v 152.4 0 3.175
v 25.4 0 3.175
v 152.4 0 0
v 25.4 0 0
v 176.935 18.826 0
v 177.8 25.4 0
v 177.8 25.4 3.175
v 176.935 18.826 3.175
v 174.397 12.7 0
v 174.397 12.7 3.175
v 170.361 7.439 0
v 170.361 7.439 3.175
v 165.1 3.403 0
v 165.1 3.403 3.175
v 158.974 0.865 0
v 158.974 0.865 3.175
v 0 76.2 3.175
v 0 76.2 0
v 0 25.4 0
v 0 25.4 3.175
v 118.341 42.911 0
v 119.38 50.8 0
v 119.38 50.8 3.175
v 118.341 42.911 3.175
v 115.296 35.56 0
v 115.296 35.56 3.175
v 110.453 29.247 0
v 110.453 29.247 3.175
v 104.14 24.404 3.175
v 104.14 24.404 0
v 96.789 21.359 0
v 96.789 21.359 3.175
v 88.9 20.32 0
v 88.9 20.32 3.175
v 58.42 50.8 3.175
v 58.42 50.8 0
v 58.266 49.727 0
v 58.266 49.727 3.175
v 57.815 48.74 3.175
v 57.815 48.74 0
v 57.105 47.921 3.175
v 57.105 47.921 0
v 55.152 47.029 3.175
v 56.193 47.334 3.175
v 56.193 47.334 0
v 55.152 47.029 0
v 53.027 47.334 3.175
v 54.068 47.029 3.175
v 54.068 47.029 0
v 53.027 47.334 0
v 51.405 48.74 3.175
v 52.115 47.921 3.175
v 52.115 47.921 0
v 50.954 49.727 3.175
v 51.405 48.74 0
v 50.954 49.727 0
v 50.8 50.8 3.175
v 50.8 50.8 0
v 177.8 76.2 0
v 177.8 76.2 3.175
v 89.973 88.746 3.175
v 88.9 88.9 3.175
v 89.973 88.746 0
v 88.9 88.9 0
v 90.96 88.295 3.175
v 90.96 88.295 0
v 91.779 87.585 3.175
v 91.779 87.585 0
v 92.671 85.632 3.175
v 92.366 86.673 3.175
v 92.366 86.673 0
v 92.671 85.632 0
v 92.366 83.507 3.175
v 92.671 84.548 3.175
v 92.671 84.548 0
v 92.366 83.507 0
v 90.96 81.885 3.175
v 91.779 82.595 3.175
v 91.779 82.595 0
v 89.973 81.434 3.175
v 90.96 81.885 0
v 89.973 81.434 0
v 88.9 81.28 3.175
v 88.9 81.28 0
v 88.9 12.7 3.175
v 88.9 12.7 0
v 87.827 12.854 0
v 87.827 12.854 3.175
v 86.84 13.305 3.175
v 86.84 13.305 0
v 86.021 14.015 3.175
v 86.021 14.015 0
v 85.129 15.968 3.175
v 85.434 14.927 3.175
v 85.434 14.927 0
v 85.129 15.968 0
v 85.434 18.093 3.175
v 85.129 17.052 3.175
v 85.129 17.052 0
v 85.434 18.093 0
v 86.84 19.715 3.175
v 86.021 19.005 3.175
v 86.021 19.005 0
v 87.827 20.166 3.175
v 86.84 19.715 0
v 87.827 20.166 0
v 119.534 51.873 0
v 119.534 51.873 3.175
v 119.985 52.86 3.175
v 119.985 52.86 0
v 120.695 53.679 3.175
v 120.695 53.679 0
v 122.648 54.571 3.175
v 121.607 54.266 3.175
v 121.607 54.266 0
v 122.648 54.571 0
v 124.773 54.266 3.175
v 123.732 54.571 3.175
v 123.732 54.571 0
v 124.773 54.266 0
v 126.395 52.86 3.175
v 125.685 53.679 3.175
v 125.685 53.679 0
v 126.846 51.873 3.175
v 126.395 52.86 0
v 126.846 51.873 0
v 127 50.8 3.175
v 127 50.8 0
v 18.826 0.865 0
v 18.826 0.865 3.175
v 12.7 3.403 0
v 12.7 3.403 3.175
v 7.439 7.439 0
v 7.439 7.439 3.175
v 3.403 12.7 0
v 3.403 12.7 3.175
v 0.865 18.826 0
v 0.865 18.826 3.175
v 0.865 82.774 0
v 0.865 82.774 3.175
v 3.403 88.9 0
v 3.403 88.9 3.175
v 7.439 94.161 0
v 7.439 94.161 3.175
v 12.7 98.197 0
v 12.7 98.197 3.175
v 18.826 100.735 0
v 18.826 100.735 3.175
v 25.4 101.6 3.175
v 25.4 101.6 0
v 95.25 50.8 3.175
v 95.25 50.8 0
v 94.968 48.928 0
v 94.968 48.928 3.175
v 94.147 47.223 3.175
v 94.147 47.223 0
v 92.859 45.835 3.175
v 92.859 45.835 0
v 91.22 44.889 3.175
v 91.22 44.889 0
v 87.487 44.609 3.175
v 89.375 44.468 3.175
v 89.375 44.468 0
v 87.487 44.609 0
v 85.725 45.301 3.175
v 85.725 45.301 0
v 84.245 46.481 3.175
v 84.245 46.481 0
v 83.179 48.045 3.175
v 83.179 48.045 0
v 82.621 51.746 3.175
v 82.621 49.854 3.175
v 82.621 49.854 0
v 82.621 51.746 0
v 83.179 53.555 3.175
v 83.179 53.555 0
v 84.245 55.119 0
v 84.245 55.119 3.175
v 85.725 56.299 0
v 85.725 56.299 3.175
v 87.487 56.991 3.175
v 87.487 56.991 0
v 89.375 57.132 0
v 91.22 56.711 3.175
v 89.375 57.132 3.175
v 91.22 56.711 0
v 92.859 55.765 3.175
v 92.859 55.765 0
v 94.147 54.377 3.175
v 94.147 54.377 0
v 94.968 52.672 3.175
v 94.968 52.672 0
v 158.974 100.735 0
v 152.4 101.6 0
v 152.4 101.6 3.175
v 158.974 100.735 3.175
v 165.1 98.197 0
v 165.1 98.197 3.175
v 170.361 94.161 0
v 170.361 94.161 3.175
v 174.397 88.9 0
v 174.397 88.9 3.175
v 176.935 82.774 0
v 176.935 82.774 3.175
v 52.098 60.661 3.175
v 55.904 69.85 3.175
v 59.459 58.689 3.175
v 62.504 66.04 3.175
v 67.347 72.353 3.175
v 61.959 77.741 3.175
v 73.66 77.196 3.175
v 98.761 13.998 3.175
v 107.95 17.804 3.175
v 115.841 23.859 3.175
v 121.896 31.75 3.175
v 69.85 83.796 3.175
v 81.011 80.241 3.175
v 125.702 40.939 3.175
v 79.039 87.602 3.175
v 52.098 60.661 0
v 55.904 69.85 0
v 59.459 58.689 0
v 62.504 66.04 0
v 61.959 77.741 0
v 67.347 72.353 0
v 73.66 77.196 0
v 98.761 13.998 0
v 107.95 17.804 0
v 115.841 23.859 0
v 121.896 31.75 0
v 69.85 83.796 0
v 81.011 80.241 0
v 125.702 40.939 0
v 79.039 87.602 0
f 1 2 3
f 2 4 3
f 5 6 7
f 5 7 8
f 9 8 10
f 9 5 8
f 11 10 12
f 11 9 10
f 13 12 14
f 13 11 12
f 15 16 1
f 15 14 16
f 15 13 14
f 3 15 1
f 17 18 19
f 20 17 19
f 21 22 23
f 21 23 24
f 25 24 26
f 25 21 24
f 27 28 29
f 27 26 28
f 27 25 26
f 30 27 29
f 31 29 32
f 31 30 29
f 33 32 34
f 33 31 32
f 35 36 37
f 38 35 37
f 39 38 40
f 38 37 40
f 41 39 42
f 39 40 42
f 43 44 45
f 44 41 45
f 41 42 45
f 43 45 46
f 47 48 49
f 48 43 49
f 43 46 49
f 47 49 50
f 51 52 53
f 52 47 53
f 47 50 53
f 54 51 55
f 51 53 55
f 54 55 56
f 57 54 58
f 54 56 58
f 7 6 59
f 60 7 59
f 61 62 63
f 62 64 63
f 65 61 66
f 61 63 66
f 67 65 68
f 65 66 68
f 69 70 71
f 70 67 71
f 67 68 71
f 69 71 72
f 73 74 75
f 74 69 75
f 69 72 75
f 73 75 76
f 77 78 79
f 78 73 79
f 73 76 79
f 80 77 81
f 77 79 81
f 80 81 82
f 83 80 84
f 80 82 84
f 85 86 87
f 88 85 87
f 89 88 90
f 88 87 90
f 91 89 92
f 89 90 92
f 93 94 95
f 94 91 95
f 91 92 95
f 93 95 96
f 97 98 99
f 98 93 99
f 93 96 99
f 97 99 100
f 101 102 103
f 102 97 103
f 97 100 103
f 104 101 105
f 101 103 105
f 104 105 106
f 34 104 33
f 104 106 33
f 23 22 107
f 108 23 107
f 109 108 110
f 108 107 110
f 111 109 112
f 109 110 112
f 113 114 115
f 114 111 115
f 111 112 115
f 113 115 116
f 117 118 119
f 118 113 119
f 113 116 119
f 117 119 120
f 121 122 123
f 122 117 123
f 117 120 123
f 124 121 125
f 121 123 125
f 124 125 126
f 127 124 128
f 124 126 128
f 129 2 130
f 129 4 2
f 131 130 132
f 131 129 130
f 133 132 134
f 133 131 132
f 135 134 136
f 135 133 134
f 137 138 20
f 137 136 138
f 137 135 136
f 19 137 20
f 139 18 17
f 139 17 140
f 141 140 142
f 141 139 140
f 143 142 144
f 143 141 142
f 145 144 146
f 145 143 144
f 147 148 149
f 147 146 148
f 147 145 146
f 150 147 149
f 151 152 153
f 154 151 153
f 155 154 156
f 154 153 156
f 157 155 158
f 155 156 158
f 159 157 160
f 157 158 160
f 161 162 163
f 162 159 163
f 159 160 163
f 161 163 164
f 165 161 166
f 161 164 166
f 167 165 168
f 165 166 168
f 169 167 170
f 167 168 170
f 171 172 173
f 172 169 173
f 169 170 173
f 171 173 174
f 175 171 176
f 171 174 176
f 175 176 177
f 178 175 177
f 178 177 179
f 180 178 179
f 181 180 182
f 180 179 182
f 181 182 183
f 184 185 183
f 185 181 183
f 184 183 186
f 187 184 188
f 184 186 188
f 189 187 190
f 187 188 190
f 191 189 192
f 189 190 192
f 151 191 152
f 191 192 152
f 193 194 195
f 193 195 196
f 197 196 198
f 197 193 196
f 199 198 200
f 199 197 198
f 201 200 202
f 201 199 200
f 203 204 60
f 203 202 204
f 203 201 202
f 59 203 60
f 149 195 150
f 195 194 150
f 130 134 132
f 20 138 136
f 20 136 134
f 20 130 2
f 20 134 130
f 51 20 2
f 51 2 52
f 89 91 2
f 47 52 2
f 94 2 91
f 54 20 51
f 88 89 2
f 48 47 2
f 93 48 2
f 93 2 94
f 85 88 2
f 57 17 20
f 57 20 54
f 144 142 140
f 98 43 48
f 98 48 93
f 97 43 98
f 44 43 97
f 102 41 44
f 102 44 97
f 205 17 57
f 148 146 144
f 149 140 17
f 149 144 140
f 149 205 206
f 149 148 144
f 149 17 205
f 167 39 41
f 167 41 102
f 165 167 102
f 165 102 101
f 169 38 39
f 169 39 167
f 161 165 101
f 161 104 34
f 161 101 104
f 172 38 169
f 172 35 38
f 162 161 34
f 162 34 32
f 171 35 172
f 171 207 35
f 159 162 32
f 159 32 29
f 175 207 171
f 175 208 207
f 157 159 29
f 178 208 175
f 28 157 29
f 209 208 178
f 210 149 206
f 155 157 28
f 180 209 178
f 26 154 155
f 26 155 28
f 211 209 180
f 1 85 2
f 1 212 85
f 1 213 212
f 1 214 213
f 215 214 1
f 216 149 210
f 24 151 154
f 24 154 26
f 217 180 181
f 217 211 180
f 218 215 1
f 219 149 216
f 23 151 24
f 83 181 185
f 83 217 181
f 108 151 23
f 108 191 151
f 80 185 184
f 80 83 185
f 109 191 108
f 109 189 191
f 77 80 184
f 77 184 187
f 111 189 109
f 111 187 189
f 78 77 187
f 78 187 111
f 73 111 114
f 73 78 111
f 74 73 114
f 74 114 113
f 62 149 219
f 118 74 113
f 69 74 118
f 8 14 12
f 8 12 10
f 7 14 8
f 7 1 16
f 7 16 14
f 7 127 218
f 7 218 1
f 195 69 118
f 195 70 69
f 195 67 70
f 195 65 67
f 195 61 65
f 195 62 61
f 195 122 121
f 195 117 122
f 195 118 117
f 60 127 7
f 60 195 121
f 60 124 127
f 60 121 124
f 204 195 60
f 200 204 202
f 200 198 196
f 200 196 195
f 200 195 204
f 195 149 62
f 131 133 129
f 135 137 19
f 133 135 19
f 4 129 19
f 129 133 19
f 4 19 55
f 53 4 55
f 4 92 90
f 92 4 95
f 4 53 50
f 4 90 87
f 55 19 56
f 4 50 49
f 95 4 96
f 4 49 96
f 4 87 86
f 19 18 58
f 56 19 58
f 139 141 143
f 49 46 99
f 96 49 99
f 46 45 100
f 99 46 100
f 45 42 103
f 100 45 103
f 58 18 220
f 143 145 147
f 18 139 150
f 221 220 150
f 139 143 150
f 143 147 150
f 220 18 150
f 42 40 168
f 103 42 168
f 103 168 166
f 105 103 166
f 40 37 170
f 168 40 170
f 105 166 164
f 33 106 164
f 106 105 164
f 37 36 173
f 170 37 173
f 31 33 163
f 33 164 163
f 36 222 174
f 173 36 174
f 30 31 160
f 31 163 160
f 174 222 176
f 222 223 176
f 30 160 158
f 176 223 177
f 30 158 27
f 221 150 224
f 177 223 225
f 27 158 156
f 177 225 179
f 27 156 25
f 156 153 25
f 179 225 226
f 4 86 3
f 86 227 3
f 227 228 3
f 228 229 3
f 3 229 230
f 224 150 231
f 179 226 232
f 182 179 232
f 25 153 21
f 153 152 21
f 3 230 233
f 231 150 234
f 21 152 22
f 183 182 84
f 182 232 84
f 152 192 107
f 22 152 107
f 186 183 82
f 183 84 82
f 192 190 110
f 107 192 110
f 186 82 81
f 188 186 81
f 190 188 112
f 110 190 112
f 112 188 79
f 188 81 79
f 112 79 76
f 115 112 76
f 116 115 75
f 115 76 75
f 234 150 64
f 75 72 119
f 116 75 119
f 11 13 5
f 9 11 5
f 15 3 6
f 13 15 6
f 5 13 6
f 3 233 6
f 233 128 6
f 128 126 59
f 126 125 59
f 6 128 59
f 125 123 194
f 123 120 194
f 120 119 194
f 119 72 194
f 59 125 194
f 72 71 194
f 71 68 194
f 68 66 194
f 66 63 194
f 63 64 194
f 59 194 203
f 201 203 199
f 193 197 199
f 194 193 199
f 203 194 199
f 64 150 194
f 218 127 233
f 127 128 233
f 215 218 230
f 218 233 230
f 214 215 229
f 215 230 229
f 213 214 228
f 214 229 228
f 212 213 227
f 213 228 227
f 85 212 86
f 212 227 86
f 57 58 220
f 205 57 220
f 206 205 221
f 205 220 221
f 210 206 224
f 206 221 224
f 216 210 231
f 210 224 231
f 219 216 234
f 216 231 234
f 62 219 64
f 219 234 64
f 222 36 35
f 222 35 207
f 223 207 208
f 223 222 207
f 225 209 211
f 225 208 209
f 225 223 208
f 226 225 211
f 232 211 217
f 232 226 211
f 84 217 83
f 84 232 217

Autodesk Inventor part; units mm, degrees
ref_plane "YZ Plane" through (0, 0, 0) normal (1, 0, 0) x (0, 1, 0)
ref_plane "XZ Plane" through (0, 0, 0) normal (0, 1, 0) x (-1, 0, 0)
ref_plane "XY Plane" through (0, 0, 0) normal (0, 0, 1) x (1, 0, 0)
sketch "Sketch1" plane through (0, 0, 0) normal (0, 0, 1) x (1, 0, 0)
  line L0 (0, 0) -> (177.8, 0)
  line L1 (177.8, 0) -> (177.8, 101.6)
  line L2 (177.8, 101.6) -> (0, 101.6)
  line L3 (0, 101.6) -> (0, 0)
  arc A0 (25.4, 101.6) -> (0, 76.2) centre (25.4, 76.2) ccw
  arc A1 (177.8, 76.2) -> (152.4, 101.6) centre (152.4, 76.2) ccw
  arc A2 (152.4, 0) -> (177.8, 25.4) centre (152.4, 25.4) ccw
  arc A3 (0, 25.4) -> (25.4, 0) centre (25.4, 25.4) ccw
  circle A4 centre (88.9, 50.8) radius 6.35
  arc A5 (88.9, 85.09) -> (54.61, 50.8) centre (88.9, 50.8) ccw construction
  arc A6 (88.9, 88.9) -> (50.8, 50.8) centre (88.9, 50.8) ccw
  arc A7 (88.9, 81.28) -> (58.42, 50.8) centre (88.9, 50.8) ccw
  arc A8 (88.9, 81.28) -> (88.9, 88.9) centre (88.9, 85.09) ccw
  arc A9 (50.8, 50.8) -> (58.42, 50.8) centre (54.61, 50.8) ccw
  line L4 (88.9, 50.8) -> (54.61, 50.8) construction
  line L5 (88.9, 50.8) -> (88.9, 85.09) construction
  arc A10 (88.9, 20.32) -> (119.38, 50.8) centre (88.9, 50.8) ccw
  line L6 (88.9, 50.8) -> (123.19, 50.8) construction
  arc A11 (88.9, 16.51) -> (123.19, 50.8) centre (88.9, 50.8) ccw construction
  arc A12 (127, 50.8) -> (119.38, 50.8) centre (123.19, 50.8) ccw
  arc A13 (88.9, 12.7) -> (127, 50.8) centre (88.9, 50.8) ccw
  arc A14 (88.9, 20.32) -> (88.9, 12.7) centre (88.9, 16.51) ccw
  point P0 (0, 0)
  dimension "d2" = 177.8
  dimension "d3" = 101.6
  dimension "d4" = 50.8
  dimension "d5" = 50.8
  dimension "d6" = 50.8
  dimension "d7" = 50.8
  dimension "d8" = 12.7
  dimension "d9" = 50.8
  dimension "d10" = 88.9
  dimension "d11" = 34.29
  dimension "d12" = 90
  dimension "d13" = 7.62
  dimension "d14" = 360
  dimension "d15" = 0
  dimension "d16" = 0
extrude "Extrusion1" add sketch "Sketch1" along normal blind 3.175 contours A3 L3 A0 L2 A1 L1 A2 L0
properties part number "Front_plate"
